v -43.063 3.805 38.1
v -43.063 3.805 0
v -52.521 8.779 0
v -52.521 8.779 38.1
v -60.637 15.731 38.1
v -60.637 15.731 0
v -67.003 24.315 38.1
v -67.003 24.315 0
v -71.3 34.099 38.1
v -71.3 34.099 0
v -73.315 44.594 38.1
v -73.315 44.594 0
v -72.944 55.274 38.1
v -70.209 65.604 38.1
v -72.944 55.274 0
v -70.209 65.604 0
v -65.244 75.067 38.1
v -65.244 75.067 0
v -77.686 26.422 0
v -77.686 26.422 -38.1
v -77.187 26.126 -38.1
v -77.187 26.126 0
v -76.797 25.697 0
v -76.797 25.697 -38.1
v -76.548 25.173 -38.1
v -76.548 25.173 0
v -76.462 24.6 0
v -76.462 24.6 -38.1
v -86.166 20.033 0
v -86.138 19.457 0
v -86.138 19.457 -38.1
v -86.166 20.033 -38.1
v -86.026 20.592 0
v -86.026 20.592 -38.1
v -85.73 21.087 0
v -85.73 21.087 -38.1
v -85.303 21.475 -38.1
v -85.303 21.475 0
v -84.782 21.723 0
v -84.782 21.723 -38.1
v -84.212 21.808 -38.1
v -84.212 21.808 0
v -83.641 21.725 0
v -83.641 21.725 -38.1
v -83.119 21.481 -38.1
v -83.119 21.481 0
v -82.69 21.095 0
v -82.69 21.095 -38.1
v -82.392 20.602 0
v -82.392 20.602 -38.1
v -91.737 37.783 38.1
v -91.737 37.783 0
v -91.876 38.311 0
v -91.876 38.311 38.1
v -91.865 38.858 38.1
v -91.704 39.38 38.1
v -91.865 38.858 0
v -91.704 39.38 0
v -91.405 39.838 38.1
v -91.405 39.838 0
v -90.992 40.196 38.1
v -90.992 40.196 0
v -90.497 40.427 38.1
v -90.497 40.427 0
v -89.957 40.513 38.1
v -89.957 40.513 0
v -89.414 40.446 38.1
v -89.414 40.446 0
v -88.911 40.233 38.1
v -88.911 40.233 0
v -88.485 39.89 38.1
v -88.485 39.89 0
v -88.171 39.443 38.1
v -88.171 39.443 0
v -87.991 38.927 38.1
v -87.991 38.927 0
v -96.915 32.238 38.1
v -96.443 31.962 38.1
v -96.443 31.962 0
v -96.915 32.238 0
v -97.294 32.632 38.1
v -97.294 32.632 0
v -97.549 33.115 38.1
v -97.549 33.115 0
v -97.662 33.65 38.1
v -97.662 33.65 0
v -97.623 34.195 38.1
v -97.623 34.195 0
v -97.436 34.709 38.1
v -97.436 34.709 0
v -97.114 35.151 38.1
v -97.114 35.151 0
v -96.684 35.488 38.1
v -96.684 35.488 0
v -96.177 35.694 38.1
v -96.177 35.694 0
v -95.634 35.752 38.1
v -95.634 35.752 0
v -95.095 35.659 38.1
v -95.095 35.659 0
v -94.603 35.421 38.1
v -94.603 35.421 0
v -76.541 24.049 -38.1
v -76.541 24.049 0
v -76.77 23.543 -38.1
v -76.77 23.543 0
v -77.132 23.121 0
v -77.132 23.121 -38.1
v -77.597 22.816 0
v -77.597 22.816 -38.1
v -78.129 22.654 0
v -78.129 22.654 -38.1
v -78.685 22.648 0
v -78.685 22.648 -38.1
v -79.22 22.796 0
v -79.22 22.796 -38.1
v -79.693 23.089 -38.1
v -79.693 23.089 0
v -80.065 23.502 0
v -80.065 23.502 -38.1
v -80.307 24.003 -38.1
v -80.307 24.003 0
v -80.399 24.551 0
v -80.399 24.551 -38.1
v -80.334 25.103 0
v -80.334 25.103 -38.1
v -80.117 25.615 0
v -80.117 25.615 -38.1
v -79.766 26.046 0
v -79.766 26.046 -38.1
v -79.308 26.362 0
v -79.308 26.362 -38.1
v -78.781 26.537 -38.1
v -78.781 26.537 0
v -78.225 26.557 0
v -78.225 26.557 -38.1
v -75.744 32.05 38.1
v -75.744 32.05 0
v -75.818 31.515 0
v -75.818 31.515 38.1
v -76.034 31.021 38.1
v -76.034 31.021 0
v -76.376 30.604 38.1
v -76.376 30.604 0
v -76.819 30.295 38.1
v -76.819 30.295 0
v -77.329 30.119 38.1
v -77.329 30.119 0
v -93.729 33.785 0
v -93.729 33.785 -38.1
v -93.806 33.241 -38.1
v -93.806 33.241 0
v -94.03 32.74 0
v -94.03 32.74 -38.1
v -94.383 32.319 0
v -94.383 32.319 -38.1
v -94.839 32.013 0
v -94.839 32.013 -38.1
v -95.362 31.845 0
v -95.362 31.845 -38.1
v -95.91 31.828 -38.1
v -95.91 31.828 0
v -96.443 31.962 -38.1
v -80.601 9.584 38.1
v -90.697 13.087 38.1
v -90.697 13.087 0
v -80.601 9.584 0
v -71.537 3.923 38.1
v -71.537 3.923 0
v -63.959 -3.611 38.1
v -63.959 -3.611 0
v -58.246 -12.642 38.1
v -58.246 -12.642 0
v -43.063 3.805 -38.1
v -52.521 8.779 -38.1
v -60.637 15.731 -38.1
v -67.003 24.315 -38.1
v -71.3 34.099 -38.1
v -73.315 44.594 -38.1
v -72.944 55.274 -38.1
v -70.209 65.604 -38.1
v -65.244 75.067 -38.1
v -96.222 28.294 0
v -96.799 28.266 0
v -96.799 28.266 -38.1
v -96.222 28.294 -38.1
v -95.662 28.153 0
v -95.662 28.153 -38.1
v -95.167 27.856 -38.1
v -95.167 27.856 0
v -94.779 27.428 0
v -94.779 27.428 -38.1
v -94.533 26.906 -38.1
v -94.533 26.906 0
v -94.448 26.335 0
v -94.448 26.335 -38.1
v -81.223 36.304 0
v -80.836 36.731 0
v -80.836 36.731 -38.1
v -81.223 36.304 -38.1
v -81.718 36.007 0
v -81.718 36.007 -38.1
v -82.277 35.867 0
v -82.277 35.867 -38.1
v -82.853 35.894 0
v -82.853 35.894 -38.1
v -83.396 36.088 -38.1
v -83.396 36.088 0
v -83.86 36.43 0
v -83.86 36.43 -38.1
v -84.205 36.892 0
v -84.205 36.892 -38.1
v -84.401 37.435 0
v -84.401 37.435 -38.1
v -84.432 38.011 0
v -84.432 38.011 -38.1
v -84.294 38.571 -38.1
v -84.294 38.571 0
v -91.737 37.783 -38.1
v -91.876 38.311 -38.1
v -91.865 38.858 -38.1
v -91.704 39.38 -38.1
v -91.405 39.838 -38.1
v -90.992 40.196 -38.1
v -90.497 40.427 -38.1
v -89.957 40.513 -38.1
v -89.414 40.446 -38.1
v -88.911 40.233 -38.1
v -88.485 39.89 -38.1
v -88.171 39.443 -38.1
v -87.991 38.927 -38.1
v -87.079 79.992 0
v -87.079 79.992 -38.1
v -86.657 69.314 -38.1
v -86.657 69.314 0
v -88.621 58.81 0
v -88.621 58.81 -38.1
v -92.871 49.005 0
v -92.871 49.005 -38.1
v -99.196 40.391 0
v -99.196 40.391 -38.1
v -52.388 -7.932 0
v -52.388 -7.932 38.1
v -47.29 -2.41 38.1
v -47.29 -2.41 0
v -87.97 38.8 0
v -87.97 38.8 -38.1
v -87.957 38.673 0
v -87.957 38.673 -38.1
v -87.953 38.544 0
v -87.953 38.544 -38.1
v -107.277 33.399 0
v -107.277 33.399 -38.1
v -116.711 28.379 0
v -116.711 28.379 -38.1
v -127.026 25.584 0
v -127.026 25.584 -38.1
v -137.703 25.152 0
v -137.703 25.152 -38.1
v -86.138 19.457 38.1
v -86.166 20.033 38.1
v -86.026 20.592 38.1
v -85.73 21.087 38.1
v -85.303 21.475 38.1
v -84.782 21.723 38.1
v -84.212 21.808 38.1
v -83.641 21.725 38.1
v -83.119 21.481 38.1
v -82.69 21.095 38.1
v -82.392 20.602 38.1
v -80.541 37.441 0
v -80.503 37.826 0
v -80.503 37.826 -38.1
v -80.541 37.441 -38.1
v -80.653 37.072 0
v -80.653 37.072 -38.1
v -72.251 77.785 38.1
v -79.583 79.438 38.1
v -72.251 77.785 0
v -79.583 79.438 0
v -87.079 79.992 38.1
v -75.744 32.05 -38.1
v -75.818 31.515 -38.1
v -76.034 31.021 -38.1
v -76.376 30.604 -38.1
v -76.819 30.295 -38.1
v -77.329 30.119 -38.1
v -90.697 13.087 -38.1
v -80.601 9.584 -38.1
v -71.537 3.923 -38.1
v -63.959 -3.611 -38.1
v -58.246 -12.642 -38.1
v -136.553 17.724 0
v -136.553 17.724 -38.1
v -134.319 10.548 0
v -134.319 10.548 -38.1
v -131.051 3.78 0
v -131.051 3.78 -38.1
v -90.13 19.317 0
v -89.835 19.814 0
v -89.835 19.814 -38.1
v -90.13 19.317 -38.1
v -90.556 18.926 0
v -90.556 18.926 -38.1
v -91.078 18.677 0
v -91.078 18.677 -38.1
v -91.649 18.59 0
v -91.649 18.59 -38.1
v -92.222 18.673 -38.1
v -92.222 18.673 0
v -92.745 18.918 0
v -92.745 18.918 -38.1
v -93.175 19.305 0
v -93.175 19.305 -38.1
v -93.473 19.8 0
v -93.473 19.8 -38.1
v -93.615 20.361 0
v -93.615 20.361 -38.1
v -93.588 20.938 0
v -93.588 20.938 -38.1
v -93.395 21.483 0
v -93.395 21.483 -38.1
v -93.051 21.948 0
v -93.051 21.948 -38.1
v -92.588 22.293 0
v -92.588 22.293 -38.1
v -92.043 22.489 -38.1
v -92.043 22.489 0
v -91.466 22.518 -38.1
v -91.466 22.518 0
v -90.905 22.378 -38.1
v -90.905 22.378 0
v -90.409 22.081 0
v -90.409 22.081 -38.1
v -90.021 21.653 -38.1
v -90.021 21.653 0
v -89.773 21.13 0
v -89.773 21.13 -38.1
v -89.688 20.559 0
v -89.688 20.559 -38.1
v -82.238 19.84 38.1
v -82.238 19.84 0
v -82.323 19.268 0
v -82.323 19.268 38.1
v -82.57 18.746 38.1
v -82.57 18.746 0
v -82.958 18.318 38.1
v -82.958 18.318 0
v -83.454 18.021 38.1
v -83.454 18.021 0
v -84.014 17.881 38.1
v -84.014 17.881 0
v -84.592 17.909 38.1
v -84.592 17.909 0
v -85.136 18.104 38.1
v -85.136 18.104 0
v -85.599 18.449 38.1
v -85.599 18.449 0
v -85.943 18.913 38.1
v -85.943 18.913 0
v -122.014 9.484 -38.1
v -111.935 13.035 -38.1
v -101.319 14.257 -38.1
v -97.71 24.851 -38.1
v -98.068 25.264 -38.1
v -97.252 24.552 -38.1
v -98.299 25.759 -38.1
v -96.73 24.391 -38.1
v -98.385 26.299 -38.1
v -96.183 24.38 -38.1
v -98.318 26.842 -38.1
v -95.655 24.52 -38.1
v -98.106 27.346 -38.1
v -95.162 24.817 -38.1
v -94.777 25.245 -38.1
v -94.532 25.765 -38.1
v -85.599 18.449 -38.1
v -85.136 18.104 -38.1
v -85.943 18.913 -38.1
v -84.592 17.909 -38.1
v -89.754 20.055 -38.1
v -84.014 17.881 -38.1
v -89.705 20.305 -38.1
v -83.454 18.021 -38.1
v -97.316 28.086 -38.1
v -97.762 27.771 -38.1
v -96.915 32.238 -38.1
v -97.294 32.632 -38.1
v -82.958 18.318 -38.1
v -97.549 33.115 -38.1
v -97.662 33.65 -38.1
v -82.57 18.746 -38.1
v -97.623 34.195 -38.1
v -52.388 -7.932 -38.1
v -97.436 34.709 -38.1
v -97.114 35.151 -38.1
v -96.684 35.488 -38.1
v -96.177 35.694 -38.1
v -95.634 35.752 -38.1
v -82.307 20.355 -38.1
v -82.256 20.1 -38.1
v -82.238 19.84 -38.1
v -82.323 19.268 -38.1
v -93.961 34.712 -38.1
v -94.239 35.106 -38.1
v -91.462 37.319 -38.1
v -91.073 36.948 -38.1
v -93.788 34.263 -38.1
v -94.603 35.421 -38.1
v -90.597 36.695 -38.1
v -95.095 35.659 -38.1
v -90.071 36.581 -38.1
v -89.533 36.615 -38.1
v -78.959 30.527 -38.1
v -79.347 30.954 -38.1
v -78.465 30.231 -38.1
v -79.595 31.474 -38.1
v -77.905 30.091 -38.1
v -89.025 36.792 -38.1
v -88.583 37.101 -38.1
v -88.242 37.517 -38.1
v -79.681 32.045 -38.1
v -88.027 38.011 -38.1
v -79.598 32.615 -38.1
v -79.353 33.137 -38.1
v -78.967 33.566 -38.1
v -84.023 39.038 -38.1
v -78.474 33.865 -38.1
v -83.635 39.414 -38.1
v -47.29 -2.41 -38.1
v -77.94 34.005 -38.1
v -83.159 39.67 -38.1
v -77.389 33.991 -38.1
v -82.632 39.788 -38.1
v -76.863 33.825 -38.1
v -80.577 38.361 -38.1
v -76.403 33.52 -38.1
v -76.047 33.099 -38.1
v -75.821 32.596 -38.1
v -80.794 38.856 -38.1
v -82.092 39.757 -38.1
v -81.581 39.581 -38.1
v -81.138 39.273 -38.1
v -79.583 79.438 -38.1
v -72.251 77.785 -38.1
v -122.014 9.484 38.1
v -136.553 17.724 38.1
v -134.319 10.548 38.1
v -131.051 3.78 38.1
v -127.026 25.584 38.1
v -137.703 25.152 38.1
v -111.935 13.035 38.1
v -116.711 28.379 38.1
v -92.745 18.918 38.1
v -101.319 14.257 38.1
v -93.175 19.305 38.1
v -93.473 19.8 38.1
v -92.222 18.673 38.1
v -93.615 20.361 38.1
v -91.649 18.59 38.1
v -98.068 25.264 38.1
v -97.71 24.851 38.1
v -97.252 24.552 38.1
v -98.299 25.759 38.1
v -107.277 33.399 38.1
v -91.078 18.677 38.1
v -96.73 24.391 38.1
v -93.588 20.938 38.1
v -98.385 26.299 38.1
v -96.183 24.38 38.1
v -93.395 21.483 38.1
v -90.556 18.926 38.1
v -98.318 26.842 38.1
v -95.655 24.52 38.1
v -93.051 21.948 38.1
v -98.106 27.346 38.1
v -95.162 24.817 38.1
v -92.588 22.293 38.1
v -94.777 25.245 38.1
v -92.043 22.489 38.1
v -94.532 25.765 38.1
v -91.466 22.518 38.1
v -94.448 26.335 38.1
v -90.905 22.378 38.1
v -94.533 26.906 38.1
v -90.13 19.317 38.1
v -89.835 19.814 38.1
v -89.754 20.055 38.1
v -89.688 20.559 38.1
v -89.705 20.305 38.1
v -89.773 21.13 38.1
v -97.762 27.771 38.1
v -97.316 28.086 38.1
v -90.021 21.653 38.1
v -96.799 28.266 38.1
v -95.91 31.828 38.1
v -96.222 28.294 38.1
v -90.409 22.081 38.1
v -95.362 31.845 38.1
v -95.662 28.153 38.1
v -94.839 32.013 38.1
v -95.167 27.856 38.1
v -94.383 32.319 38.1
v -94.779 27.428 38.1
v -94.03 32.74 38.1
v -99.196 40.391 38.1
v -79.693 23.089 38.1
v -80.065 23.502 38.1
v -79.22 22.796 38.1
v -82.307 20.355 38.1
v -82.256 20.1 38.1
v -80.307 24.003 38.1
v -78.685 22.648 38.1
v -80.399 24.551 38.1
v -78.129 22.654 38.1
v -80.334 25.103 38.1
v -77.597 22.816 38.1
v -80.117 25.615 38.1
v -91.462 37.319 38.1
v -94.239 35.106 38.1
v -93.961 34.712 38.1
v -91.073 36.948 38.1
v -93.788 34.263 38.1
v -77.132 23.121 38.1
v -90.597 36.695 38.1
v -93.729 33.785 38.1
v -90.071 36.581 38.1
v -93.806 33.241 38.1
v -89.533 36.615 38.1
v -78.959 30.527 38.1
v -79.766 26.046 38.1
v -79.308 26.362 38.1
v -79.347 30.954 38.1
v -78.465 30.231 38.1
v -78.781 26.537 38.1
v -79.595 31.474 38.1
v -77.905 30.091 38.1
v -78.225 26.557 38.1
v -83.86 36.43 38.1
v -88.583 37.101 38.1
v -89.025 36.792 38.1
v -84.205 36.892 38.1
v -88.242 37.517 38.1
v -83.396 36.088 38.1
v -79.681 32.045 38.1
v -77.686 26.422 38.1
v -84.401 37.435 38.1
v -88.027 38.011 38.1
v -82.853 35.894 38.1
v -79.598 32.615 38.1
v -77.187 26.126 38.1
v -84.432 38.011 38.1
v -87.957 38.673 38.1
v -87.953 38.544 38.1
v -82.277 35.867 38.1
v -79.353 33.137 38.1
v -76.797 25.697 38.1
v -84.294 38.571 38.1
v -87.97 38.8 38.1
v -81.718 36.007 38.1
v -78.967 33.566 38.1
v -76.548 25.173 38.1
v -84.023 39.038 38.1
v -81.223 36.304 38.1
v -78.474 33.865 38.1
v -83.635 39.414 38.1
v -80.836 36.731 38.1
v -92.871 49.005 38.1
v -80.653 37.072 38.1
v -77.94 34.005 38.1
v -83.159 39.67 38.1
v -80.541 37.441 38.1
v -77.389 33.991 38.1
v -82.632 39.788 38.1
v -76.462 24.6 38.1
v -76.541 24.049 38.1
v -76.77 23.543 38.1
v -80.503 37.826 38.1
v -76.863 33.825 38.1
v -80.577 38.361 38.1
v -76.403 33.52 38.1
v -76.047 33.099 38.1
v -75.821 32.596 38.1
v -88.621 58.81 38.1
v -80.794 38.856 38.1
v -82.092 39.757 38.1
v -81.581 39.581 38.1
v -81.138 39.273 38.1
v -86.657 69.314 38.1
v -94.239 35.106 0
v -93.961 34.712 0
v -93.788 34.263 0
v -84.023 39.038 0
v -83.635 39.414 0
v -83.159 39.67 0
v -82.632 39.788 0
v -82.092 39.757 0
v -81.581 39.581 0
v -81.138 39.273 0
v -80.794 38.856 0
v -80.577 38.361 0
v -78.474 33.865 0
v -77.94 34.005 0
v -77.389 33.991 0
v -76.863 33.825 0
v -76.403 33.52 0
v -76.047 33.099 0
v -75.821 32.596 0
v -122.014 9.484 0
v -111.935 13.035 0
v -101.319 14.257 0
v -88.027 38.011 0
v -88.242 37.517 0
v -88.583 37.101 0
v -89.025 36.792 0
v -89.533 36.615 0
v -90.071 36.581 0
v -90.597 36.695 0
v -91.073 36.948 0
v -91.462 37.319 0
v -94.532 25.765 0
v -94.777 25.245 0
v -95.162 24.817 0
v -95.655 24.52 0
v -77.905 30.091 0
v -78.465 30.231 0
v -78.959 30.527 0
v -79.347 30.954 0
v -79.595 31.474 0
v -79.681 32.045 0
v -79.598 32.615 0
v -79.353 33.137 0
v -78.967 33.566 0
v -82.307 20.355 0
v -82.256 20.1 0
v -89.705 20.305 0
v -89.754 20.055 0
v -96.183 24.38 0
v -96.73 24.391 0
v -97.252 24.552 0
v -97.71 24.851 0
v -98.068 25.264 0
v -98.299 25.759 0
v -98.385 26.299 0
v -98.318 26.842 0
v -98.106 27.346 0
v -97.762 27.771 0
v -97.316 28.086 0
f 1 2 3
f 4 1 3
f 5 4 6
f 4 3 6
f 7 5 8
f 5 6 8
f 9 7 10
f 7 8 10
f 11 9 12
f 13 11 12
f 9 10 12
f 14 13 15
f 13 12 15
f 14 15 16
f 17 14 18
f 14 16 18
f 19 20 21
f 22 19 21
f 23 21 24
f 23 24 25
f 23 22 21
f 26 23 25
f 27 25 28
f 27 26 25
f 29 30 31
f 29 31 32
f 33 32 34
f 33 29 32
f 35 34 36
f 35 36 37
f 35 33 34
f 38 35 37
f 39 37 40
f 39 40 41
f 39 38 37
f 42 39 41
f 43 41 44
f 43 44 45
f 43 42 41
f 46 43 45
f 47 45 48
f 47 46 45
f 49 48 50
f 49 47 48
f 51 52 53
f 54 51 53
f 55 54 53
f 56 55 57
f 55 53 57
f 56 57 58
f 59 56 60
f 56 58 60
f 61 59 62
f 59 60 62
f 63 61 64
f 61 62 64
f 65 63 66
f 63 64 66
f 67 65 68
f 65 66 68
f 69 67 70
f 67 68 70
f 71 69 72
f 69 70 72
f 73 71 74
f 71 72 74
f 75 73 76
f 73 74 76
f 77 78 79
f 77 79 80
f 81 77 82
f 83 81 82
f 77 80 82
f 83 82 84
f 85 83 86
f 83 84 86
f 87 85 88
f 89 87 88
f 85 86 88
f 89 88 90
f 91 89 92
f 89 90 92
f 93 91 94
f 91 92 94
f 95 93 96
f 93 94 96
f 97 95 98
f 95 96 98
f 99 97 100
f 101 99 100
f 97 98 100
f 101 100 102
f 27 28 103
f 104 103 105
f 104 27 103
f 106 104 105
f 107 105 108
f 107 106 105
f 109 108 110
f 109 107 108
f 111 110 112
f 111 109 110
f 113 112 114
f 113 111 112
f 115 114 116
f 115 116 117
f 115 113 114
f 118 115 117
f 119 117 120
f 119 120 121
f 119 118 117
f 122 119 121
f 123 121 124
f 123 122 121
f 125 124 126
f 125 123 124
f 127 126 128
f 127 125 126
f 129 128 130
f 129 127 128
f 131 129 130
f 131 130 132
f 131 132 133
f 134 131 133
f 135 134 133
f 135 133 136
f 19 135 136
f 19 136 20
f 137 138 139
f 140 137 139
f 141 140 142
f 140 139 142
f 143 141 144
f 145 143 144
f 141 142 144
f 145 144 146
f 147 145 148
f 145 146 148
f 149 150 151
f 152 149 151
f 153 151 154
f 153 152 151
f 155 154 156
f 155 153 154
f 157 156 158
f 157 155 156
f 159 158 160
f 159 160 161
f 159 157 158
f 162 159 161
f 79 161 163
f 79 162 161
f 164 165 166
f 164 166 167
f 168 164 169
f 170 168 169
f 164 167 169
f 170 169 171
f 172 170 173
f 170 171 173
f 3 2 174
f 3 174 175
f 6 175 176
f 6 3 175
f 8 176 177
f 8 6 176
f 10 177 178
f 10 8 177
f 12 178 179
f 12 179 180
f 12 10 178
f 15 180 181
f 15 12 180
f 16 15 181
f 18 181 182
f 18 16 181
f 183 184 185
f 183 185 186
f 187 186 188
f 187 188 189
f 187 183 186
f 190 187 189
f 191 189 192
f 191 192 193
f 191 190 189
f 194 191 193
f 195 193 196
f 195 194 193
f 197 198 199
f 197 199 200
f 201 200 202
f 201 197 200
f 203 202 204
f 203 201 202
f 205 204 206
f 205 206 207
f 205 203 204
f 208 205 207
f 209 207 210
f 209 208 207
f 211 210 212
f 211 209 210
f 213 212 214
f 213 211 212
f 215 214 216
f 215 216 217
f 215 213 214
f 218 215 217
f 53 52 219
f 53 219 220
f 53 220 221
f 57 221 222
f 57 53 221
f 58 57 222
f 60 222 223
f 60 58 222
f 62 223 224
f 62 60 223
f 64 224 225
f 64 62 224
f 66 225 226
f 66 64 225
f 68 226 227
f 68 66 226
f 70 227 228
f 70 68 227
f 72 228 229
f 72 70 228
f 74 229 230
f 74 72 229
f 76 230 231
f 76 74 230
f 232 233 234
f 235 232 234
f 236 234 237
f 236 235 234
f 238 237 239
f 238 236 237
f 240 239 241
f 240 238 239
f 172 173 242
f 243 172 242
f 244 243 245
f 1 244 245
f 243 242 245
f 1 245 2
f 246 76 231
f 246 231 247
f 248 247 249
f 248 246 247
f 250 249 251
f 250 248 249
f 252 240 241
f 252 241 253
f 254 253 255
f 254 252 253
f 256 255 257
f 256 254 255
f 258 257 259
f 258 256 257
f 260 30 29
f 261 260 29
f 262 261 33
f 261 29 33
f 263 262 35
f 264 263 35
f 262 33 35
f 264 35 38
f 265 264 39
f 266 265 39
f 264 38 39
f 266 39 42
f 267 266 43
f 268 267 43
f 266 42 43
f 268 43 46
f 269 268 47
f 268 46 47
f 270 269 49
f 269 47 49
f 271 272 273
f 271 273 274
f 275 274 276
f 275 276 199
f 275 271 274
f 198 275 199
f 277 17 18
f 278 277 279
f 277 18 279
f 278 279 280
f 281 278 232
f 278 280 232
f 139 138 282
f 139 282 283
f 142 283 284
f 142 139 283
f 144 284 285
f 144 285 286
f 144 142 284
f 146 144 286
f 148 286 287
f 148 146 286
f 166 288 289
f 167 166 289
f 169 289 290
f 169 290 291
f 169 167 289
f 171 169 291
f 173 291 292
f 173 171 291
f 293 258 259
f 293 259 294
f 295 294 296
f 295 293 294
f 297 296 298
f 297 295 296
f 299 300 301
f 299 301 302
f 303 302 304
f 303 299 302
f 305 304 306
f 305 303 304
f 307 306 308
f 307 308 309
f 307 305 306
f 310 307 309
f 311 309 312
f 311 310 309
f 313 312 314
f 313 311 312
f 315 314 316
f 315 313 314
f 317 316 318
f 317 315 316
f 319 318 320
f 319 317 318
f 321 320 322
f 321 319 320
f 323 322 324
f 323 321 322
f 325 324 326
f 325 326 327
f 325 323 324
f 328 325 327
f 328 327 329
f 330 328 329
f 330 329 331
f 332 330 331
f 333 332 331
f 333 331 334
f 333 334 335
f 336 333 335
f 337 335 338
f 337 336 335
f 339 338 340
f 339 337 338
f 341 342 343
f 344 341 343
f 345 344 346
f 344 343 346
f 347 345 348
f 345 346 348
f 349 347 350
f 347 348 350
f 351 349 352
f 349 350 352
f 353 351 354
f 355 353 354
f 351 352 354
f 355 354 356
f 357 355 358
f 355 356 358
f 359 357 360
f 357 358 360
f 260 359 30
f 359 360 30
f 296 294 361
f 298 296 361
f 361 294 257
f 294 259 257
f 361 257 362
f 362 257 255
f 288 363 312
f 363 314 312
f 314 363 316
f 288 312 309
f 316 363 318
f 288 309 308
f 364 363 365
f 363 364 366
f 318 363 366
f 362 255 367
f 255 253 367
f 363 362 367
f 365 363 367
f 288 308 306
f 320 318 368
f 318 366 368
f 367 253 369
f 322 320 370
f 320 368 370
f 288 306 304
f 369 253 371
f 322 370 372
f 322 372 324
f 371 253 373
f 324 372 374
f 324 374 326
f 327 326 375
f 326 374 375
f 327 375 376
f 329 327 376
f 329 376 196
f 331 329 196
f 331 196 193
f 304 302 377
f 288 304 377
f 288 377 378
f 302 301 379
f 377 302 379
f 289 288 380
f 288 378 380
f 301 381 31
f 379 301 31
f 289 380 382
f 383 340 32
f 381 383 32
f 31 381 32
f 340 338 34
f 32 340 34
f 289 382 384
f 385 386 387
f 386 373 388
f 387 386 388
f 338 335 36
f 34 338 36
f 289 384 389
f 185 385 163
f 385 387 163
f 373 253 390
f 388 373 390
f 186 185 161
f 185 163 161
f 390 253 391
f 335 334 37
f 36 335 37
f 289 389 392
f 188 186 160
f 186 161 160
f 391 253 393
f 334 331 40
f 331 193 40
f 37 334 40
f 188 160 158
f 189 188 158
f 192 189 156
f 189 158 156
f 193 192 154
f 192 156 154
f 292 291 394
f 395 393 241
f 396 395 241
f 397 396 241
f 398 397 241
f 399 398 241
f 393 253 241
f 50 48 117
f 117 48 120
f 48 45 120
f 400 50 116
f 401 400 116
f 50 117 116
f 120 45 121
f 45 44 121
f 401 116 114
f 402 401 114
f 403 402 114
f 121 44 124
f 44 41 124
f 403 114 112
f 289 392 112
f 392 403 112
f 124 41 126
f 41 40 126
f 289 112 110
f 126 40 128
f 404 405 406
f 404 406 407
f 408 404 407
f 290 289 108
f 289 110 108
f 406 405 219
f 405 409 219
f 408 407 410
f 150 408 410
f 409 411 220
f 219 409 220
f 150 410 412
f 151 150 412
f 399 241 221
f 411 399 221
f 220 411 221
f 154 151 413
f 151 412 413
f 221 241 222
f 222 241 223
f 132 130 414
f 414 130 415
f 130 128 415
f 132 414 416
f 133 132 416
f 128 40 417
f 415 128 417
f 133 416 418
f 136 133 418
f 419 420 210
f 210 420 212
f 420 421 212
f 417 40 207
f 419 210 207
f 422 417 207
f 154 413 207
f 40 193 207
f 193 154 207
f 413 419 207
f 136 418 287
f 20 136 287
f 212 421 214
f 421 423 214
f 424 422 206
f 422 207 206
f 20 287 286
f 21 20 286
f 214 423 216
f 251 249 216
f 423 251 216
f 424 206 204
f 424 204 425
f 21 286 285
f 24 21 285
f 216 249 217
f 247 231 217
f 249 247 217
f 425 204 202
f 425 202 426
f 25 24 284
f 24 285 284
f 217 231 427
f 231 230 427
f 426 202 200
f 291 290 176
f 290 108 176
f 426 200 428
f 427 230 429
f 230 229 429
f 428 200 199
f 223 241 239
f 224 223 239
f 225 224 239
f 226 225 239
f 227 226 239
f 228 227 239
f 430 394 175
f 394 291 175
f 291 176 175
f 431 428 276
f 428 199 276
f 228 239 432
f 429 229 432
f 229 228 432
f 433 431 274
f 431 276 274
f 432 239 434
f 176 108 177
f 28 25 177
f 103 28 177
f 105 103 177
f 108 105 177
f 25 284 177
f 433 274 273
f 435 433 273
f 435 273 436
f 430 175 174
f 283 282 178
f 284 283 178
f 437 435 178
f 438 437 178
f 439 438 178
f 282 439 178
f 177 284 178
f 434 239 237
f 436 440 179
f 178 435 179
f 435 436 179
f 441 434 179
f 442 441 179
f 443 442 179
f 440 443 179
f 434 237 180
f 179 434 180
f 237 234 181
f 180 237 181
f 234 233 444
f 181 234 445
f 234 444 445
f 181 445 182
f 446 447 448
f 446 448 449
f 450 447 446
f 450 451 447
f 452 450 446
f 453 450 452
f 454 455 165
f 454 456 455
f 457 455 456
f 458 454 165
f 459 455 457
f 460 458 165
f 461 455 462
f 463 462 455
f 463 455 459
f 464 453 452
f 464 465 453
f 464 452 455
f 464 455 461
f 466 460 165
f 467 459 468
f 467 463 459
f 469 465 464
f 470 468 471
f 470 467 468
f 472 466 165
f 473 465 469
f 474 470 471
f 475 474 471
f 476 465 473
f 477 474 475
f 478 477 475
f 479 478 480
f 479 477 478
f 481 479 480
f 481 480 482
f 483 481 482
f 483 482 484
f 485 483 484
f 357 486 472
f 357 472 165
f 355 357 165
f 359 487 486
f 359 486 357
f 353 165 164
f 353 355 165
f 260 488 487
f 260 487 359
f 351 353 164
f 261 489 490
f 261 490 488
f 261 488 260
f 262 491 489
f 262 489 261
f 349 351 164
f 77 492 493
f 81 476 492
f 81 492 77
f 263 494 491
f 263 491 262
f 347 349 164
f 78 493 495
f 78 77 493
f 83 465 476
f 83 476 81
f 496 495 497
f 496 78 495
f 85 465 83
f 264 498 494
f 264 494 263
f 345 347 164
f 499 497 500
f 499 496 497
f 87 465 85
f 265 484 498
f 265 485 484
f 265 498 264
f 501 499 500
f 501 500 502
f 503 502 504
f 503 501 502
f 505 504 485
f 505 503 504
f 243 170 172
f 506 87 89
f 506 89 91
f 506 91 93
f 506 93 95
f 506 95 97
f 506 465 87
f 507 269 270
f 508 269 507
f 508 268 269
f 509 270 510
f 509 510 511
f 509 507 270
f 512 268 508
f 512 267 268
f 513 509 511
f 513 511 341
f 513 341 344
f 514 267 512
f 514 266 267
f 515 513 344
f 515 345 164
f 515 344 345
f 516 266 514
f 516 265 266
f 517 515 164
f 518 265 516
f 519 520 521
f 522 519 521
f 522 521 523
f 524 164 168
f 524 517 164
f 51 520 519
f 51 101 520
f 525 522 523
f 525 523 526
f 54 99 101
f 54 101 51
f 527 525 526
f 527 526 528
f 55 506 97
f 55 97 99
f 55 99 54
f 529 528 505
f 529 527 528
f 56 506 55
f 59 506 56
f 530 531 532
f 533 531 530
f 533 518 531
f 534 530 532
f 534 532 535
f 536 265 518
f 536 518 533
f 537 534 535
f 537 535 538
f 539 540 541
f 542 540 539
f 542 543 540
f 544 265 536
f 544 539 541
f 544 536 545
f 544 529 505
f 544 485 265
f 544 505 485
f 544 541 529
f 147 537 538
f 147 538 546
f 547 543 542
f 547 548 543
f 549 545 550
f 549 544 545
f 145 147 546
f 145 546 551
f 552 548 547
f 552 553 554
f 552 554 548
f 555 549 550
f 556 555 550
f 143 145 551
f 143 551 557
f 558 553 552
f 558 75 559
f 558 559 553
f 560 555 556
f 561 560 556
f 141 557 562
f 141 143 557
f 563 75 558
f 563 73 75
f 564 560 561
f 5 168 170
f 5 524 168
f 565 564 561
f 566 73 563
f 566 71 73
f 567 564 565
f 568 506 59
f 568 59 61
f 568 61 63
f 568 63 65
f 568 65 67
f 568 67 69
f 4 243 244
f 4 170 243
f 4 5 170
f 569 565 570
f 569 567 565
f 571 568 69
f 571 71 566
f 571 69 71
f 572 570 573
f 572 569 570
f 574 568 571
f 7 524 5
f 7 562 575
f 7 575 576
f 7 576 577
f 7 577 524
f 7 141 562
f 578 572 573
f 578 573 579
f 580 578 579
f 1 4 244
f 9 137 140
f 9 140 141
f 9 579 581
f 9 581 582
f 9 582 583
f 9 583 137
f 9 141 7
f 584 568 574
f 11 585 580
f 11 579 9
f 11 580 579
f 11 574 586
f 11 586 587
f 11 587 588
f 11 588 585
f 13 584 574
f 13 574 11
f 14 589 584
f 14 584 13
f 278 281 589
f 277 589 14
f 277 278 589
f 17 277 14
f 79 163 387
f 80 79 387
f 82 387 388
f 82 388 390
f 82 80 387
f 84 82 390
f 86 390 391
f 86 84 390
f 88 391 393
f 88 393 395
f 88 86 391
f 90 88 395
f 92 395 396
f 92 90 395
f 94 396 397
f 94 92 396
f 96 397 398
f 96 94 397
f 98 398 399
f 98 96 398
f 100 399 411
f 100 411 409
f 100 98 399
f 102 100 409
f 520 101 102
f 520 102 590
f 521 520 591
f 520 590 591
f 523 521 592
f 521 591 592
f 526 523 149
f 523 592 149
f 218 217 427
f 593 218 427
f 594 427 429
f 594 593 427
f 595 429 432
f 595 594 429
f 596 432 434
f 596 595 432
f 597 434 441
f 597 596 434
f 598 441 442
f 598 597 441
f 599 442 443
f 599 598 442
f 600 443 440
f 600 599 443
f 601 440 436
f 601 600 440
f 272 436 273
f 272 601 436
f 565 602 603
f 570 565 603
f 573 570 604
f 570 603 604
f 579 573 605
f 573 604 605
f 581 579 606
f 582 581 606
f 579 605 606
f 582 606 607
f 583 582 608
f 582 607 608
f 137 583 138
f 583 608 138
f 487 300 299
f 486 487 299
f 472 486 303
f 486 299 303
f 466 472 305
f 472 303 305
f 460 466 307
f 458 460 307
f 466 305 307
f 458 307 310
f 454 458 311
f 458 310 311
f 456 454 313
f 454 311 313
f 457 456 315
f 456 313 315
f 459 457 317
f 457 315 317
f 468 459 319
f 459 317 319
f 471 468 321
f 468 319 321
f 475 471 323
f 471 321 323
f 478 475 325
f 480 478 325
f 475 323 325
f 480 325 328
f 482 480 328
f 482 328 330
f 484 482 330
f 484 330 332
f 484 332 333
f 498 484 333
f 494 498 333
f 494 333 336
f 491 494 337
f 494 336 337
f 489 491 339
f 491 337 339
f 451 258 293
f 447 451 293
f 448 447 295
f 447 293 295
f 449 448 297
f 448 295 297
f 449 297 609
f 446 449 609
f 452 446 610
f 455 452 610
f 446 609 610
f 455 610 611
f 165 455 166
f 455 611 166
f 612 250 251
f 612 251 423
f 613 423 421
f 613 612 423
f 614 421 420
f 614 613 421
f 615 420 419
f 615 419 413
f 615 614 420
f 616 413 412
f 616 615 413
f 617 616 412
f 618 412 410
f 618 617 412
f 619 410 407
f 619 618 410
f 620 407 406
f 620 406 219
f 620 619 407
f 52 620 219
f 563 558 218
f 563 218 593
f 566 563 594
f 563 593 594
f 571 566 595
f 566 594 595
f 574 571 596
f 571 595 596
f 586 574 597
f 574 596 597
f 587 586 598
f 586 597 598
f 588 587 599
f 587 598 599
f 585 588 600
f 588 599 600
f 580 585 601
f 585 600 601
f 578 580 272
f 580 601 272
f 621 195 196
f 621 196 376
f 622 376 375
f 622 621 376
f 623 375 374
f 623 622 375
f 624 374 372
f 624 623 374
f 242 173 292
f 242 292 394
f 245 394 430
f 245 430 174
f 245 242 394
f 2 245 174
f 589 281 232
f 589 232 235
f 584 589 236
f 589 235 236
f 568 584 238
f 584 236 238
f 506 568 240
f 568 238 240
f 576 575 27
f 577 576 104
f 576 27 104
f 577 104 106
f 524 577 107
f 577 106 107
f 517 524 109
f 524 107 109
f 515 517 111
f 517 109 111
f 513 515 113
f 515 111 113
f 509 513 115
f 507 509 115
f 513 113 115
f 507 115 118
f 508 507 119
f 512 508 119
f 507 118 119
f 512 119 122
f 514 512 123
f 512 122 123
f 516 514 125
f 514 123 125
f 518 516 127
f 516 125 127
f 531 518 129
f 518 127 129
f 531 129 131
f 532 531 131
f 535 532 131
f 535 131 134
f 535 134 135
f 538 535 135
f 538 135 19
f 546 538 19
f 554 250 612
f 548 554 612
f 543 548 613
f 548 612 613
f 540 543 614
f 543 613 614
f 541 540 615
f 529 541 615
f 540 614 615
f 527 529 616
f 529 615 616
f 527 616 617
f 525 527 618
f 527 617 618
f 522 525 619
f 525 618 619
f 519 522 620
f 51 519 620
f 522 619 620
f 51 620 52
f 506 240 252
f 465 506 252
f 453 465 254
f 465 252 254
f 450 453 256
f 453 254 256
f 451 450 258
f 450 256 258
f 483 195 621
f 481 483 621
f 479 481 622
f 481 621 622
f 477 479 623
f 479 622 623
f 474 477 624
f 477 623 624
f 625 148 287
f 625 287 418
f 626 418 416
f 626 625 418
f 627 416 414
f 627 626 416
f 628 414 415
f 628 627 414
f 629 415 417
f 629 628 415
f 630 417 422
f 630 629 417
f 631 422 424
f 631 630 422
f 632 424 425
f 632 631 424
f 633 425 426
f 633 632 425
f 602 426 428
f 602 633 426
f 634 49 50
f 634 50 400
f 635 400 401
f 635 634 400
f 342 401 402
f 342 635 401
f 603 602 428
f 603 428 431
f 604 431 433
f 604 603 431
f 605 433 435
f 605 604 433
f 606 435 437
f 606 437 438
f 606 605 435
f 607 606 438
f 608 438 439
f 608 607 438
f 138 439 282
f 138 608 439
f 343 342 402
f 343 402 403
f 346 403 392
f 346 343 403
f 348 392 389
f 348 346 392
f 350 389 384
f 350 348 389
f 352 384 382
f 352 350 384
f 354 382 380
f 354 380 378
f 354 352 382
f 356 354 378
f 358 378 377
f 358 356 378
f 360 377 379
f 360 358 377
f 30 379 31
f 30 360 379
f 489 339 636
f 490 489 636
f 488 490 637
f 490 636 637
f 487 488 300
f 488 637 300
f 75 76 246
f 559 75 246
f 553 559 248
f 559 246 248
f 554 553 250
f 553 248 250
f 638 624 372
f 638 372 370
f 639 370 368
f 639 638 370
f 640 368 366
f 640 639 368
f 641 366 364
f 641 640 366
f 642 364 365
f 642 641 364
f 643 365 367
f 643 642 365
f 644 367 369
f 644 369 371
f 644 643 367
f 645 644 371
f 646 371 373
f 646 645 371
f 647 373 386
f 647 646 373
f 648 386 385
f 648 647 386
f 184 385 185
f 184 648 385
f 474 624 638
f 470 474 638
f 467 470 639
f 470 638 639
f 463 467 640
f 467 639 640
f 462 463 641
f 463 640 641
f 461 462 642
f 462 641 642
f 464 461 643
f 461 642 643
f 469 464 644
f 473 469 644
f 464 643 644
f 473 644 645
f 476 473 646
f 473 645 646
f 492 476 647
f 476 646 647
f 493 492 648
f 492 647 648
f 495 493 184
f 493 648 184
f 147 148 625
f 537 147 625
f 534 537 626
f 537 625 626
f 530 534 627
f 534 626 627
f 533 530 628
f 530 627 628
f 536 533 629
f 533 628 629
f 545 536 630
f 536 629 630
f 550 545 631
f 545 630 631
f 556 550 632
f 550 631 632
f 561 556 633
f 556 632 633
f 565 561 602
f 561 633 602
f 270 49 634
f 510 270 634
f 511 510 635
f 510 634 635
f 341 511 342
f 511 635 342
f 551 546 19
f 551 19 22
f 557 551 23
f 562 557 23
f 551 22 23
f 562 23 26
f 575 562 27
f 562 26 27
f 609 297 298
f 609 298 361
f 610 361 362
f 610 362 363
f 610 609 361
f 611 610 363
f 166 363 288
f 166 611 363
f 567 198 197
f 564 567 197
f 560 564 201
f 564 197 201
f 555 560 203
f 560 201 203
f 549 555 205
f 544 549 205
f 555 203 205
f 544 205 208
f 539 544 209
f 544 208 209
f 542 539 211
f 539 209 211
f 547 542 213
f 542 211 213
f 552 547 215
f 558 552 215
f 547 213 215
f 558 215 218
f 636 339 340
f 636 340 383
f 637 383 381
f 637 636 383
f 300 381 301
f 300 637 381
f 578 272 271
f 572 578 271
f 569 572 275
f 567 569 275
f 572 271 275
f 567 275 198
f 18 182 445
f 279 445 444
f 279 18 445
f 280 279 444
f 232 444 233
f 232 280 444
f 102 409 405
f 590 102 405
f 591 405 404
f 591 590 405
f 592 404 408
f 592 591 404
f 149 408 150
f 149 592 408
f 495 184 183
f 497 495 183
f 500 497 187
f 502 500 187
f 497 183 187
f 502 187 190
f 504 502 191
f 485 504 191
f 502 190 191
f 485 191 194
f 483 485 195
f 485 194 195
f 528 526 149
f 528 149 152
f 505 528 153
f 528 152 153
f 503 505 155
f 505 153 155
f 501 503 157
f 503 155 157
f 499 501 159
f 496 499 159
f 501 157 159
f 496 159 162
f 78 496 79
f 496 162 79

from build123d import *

# Parameters (mm, degrees)
F1_DEPTH      = 38.1
F1_DEPTH_BACK = 38.1


with BuildPart() as f1:
    # F0 (on Top) → F1 (new body, two sides)
    with BuildSketch(Plane.XY) as f1_sk:
        with BuildLine():
            ThreePointArc((-90.6969597738, 13.086746717), (-76.7539676292, 16.2972540142), (-70.5542587543, 29.1921366006))
            ThreePointArc((-70.5542587543, 29.1921366006), (-70.7418172824, 31.673669272), (-71.3002314253, 34.0988200397))
            ThreePointArc((-71.3002314253, 34.0988200397), (-83.4315577445, 45.2975264864), (-99.1955851313, 40.3908427907))
            ThreePointArc((-99.1955851313, 40.3908427907), (-102.828286017, 24.2854529488), (-90.6969597738, 13.086746717))
        make_face()
        with BuildLine():
            ThreePointArc((-77.3292507738, 30.1186681005), (-77.2962629506, 29.6559242455), (-77.2852587543, 29.1921366006))
            ThreePointArc((-77.2852587543, 29.1921366006), (-77.3859317475, 27.7925554665), (-77.6858779078, 26.4217911893))
            ThreePointArc((-77.6858779078, 26.4217911893), (-76.7965239356, 25.6970936215), (-76.4622244556, 24.5996507254))
            ThreePointArc((-76.4622244556, 24.5996507254), (-77.5033356386, 22.8632918247), (-79.5254118898, 22.9636031493))
            ThreePointArc((-79.5254118898, 22.9636031493), (-80.8453813803, 21.6453223583), (-82.3916720877, 20.6016898809))
            ThreePointArc((-82.3916720877, 20.6016898809), (-82.2770283841, 20.2284516132), (-82.2383060109, 19.8399280476))
            ThreePointArc((-82.2383060109, 19.8399280476), (-84.0144862482, 17.8808452625), (-86.1377272544, 19.4571286201))
            ThreePointArc((-86.1377272544, 19.4571286201), (-88.0032519189, 19.458322711), (-89.8346041656, 19.8137557541))
            ThreePointArc((-89.8346041656, 19.8137557541), (-92.5812060719, 18.82068306), (-93.2927922056, 21.6532897362))
            ThreePointArc((-93.2927922056, 21.6532897362), (-94.6110729966, 22.9732592267), (-95.6547054739, 24.5195499341))
            ThreePointArc((-95.6547054739, 24.5195499341), (-98.2990547433, 25.759482331), (-96.7992667347, 28.2656051007))
            ThreePointArc((-96.7992667347, 28.2656051007), (-96.7980726438, 30.1311297652), (-96.4426396008, 31.9624820119))
            ThreePointArc((-96.4426396008, 31.9624820119), (-97.4357122948, 34.7090839182), (-94.6031056187, 35.420670052))
            ThreePointArc((-94.6031056187, 35.420670052), (-93.2831361282, 36.7389508429), (-91.7368454208, 37.7825833203))
            ThreePointArc((-91.7368454208, 37.7825833203), (-90.4969130238, 40.4269325897), (-87.9907902541, 38.9271445811))
            ThreePointArc((-87.9907902541, 38.9271445811), (-86.1252655897, 38.9259504902), (-84.2939133429, 38.5705174471))
            ThreePointArc((-84.2939133429, 38.5705174471), (-82.0922279233, 39.7572344826), (-80.503272879, 37.8256708993))
            ThreePointArc((-80.503272879, 37.8256708993), (-80.5882188045, 37.2536426673), (-80.8357253029, 36.7309834651))
            ThreePointArc((-80.8357253029, 36.7309834651), (-79.517444512, 35.4110139746), (-78.4738120346, 33.8647232672))
            ThreePointArc((-78.4738120346, 33.8647232672), (-76.622219003, 33.688875838), (-75.7435502012, 32.0495893439))
            ThreePointArc((-75.7435502012, 32.0495893439), (-76.1907788706, 30.8002992301), (-77.3292507738, 30.1186681005))
        make_face(mode=Mode.SUBTRACT)
        with BuildLine():
            ThreePointArc((-71.3002314253, 34.0988200397), (-70.7418172824, 31.673669272), (-70.5542587543, 29.1921366006))
            ThreePointArc((-70.5542587543, 29.1921366006), (-76.7539676292, 16.2972540142), (-90.6969597738, 13.086746717))
            ThreePointArc((-90.6969597738, 13.086746717), (-71.5368890892, 3.9232487058), (-58.2455134206, -12.6422979885))
            ThreePointArc((-58.2455134206, -12.6422979885), (-49.7371002236, -5.2654204228), (-43.0629257789, 3.804685047))
            ThreePointArc((-43.0629257789, 3.804685047), (-60.6365657041, 15.7313428229), (-71.3002314253, 34.0988200397))
        make_face()
        with BuildLine():
            ThreePointArc((-99.1955851313, 40.3908427907), (-83.4315577445, 45.2975264864), (-71.3002314253, 34.0988200397))
            ThreePointArc((-71.3002314253, 34.0988200397), (-72.9444447549, 55.2736770618), (-65.2439483139, 75.0671194593))
            ThreePointArc((-65.2439483139, 75.0671194593), (-75.8867182849, 78.747182651), (-87.0787472591, 79.9921345345))
            ThreePointArc((-87.0787472591, 79.9921345345), (-88.6207159571, 58.8095868891), (-99.1955851313, 40.3908427907))
        make_face()
        with BuildLine():
            ThreePointArc((-131.0511032248, 3.7795902204), (-111.9354945769, 13.0354799606), (-90.6969597738, 13.086746717))
            ThreePointArc((-90.6969597738, 13.086746717), (-102.828286017, 24.2854529488), (-99.1955851313, 40.3908427907))
            ThreePointArc((-99.1955851313, 40.3908427907), (-116.7114425044, 28.3794839343), (-137.7033145282, 25.151588331))
            ThreePointArc((-137.7033145282, 25.151588331), (-135.5689577543, 14.0946475737), (-131.0511032248, 3.7795902204))
        make_face()
        with BuildLine():
            ThreePointArc((-77.6858779078, 26.4217911893), (-77.3859317475, 27.7925554665), (-77.2852587543, 29.1921366006))
            ThreePointArc((-77.2852587543, 29.1921366006), (-77.2962629506, 29.6559242455), (-77.3292507738, 30.1186681005))
            ThreePointArc((-77.3292507738, 30.1186681005), (-79.5946376372, 31.4743878177), (-78.4738120346, 33.8647232672))
            ThreePointArc((-78.4738120346, 33.8647232672), (-79.517444512, 35.4110139746), (-80.8357253029, 36.7309834651))
            ThreePointArc((-80.8357253029, 36.7309834651), (-83.3962343215, 36.0877516573), (-84.2939133429, 38.5705174471))
            ThreePointArc((-84.2939133429, 38.5705174471), (-86.1252655897, 38.9259504902), (-87.9907902541, 38.9271445811))
            ThreePointArc((-87.9907902541, 38.9271445811), (-87.9626287125, 38.7366649164), (-87.9532114976, 38.5443451537))
            ThreePointArc((-87.9532114976, 38.5443451537), (-89.5331879319, 36.6145675269), (-91.7368454208, 37.7825833203))
            ThreePointArc((-91.7368454208, 37.7825833203), (-93.2831361282, 36.7389508429), (-94.6031056187, 35.420670052))
            ThreePointArc((-94.6031056187, 35.420670052), (-93.9614341522, 34.7120112928), (-93.7292930529, 33.7846224758))
            ThreePointArc((-93.7292930529, 33.7846224758), (-94.6003501568, 32.1504219558), (-96.4426396008, 31.9624820119))
            ThreePointArc((-96.4426396008, 31.9624820119), (-96.7980726438, 30.1311297652), (-96.7992667347, 28.2656051007))
            ThreePointArc((-96.7992667347, 28.2656051007), (-95.1671771935, 27.8559551879), (-94.4479673073, 26.3346838573))
            ThreePointArc((-94.4479673073, 26.3346838573), (-94.7771808133, 25.2448526591), (-95.6547054739, 24.5195499341))
            ThreePointArc((-95.6547054739, 24.5195499341), (-94.6110729966, 22.9732592267), (-93.2927922056, 21.6532897362))
            ThreePointArc((-93.2927922056, 21.6532897362), (-91.0847163975, 22.4421563765), (-89.6882446295, 20.558602302))
            ThreePointArc((-89.6882446295, 20.558602302), (-89.7251810461, 20.1790573462), (-89.8346041656, 19.8137557541))
            ThreePointArc((-89.8346041656, 19.8137557541), (-88.0032519189, 19.458322711), (-86.1377272544, 19.4571286201))
            ThreePointArc((-86.1377272544, 19.4571286201), (-84.7820075372, 21.7225154836), (-82.3916720877, 20.6016898809))
            ThreePointArc((-82.3916720877, 20.6016898809), (-80.8453813803, 21.6453223583), (-79.5254118898, 22.9636031493))
            ThreePointArc((-79.5254118898, 22.9636031493), (-80.1686436975, 25.5241121678), (-77.6858779078, 26.4217911893))
        make_face()
    extrude(amount=F1_DEPTH)
    extrude(f1_sk.sketch, amount=-F1_DEPTH_BACK)


solid = f1.part
